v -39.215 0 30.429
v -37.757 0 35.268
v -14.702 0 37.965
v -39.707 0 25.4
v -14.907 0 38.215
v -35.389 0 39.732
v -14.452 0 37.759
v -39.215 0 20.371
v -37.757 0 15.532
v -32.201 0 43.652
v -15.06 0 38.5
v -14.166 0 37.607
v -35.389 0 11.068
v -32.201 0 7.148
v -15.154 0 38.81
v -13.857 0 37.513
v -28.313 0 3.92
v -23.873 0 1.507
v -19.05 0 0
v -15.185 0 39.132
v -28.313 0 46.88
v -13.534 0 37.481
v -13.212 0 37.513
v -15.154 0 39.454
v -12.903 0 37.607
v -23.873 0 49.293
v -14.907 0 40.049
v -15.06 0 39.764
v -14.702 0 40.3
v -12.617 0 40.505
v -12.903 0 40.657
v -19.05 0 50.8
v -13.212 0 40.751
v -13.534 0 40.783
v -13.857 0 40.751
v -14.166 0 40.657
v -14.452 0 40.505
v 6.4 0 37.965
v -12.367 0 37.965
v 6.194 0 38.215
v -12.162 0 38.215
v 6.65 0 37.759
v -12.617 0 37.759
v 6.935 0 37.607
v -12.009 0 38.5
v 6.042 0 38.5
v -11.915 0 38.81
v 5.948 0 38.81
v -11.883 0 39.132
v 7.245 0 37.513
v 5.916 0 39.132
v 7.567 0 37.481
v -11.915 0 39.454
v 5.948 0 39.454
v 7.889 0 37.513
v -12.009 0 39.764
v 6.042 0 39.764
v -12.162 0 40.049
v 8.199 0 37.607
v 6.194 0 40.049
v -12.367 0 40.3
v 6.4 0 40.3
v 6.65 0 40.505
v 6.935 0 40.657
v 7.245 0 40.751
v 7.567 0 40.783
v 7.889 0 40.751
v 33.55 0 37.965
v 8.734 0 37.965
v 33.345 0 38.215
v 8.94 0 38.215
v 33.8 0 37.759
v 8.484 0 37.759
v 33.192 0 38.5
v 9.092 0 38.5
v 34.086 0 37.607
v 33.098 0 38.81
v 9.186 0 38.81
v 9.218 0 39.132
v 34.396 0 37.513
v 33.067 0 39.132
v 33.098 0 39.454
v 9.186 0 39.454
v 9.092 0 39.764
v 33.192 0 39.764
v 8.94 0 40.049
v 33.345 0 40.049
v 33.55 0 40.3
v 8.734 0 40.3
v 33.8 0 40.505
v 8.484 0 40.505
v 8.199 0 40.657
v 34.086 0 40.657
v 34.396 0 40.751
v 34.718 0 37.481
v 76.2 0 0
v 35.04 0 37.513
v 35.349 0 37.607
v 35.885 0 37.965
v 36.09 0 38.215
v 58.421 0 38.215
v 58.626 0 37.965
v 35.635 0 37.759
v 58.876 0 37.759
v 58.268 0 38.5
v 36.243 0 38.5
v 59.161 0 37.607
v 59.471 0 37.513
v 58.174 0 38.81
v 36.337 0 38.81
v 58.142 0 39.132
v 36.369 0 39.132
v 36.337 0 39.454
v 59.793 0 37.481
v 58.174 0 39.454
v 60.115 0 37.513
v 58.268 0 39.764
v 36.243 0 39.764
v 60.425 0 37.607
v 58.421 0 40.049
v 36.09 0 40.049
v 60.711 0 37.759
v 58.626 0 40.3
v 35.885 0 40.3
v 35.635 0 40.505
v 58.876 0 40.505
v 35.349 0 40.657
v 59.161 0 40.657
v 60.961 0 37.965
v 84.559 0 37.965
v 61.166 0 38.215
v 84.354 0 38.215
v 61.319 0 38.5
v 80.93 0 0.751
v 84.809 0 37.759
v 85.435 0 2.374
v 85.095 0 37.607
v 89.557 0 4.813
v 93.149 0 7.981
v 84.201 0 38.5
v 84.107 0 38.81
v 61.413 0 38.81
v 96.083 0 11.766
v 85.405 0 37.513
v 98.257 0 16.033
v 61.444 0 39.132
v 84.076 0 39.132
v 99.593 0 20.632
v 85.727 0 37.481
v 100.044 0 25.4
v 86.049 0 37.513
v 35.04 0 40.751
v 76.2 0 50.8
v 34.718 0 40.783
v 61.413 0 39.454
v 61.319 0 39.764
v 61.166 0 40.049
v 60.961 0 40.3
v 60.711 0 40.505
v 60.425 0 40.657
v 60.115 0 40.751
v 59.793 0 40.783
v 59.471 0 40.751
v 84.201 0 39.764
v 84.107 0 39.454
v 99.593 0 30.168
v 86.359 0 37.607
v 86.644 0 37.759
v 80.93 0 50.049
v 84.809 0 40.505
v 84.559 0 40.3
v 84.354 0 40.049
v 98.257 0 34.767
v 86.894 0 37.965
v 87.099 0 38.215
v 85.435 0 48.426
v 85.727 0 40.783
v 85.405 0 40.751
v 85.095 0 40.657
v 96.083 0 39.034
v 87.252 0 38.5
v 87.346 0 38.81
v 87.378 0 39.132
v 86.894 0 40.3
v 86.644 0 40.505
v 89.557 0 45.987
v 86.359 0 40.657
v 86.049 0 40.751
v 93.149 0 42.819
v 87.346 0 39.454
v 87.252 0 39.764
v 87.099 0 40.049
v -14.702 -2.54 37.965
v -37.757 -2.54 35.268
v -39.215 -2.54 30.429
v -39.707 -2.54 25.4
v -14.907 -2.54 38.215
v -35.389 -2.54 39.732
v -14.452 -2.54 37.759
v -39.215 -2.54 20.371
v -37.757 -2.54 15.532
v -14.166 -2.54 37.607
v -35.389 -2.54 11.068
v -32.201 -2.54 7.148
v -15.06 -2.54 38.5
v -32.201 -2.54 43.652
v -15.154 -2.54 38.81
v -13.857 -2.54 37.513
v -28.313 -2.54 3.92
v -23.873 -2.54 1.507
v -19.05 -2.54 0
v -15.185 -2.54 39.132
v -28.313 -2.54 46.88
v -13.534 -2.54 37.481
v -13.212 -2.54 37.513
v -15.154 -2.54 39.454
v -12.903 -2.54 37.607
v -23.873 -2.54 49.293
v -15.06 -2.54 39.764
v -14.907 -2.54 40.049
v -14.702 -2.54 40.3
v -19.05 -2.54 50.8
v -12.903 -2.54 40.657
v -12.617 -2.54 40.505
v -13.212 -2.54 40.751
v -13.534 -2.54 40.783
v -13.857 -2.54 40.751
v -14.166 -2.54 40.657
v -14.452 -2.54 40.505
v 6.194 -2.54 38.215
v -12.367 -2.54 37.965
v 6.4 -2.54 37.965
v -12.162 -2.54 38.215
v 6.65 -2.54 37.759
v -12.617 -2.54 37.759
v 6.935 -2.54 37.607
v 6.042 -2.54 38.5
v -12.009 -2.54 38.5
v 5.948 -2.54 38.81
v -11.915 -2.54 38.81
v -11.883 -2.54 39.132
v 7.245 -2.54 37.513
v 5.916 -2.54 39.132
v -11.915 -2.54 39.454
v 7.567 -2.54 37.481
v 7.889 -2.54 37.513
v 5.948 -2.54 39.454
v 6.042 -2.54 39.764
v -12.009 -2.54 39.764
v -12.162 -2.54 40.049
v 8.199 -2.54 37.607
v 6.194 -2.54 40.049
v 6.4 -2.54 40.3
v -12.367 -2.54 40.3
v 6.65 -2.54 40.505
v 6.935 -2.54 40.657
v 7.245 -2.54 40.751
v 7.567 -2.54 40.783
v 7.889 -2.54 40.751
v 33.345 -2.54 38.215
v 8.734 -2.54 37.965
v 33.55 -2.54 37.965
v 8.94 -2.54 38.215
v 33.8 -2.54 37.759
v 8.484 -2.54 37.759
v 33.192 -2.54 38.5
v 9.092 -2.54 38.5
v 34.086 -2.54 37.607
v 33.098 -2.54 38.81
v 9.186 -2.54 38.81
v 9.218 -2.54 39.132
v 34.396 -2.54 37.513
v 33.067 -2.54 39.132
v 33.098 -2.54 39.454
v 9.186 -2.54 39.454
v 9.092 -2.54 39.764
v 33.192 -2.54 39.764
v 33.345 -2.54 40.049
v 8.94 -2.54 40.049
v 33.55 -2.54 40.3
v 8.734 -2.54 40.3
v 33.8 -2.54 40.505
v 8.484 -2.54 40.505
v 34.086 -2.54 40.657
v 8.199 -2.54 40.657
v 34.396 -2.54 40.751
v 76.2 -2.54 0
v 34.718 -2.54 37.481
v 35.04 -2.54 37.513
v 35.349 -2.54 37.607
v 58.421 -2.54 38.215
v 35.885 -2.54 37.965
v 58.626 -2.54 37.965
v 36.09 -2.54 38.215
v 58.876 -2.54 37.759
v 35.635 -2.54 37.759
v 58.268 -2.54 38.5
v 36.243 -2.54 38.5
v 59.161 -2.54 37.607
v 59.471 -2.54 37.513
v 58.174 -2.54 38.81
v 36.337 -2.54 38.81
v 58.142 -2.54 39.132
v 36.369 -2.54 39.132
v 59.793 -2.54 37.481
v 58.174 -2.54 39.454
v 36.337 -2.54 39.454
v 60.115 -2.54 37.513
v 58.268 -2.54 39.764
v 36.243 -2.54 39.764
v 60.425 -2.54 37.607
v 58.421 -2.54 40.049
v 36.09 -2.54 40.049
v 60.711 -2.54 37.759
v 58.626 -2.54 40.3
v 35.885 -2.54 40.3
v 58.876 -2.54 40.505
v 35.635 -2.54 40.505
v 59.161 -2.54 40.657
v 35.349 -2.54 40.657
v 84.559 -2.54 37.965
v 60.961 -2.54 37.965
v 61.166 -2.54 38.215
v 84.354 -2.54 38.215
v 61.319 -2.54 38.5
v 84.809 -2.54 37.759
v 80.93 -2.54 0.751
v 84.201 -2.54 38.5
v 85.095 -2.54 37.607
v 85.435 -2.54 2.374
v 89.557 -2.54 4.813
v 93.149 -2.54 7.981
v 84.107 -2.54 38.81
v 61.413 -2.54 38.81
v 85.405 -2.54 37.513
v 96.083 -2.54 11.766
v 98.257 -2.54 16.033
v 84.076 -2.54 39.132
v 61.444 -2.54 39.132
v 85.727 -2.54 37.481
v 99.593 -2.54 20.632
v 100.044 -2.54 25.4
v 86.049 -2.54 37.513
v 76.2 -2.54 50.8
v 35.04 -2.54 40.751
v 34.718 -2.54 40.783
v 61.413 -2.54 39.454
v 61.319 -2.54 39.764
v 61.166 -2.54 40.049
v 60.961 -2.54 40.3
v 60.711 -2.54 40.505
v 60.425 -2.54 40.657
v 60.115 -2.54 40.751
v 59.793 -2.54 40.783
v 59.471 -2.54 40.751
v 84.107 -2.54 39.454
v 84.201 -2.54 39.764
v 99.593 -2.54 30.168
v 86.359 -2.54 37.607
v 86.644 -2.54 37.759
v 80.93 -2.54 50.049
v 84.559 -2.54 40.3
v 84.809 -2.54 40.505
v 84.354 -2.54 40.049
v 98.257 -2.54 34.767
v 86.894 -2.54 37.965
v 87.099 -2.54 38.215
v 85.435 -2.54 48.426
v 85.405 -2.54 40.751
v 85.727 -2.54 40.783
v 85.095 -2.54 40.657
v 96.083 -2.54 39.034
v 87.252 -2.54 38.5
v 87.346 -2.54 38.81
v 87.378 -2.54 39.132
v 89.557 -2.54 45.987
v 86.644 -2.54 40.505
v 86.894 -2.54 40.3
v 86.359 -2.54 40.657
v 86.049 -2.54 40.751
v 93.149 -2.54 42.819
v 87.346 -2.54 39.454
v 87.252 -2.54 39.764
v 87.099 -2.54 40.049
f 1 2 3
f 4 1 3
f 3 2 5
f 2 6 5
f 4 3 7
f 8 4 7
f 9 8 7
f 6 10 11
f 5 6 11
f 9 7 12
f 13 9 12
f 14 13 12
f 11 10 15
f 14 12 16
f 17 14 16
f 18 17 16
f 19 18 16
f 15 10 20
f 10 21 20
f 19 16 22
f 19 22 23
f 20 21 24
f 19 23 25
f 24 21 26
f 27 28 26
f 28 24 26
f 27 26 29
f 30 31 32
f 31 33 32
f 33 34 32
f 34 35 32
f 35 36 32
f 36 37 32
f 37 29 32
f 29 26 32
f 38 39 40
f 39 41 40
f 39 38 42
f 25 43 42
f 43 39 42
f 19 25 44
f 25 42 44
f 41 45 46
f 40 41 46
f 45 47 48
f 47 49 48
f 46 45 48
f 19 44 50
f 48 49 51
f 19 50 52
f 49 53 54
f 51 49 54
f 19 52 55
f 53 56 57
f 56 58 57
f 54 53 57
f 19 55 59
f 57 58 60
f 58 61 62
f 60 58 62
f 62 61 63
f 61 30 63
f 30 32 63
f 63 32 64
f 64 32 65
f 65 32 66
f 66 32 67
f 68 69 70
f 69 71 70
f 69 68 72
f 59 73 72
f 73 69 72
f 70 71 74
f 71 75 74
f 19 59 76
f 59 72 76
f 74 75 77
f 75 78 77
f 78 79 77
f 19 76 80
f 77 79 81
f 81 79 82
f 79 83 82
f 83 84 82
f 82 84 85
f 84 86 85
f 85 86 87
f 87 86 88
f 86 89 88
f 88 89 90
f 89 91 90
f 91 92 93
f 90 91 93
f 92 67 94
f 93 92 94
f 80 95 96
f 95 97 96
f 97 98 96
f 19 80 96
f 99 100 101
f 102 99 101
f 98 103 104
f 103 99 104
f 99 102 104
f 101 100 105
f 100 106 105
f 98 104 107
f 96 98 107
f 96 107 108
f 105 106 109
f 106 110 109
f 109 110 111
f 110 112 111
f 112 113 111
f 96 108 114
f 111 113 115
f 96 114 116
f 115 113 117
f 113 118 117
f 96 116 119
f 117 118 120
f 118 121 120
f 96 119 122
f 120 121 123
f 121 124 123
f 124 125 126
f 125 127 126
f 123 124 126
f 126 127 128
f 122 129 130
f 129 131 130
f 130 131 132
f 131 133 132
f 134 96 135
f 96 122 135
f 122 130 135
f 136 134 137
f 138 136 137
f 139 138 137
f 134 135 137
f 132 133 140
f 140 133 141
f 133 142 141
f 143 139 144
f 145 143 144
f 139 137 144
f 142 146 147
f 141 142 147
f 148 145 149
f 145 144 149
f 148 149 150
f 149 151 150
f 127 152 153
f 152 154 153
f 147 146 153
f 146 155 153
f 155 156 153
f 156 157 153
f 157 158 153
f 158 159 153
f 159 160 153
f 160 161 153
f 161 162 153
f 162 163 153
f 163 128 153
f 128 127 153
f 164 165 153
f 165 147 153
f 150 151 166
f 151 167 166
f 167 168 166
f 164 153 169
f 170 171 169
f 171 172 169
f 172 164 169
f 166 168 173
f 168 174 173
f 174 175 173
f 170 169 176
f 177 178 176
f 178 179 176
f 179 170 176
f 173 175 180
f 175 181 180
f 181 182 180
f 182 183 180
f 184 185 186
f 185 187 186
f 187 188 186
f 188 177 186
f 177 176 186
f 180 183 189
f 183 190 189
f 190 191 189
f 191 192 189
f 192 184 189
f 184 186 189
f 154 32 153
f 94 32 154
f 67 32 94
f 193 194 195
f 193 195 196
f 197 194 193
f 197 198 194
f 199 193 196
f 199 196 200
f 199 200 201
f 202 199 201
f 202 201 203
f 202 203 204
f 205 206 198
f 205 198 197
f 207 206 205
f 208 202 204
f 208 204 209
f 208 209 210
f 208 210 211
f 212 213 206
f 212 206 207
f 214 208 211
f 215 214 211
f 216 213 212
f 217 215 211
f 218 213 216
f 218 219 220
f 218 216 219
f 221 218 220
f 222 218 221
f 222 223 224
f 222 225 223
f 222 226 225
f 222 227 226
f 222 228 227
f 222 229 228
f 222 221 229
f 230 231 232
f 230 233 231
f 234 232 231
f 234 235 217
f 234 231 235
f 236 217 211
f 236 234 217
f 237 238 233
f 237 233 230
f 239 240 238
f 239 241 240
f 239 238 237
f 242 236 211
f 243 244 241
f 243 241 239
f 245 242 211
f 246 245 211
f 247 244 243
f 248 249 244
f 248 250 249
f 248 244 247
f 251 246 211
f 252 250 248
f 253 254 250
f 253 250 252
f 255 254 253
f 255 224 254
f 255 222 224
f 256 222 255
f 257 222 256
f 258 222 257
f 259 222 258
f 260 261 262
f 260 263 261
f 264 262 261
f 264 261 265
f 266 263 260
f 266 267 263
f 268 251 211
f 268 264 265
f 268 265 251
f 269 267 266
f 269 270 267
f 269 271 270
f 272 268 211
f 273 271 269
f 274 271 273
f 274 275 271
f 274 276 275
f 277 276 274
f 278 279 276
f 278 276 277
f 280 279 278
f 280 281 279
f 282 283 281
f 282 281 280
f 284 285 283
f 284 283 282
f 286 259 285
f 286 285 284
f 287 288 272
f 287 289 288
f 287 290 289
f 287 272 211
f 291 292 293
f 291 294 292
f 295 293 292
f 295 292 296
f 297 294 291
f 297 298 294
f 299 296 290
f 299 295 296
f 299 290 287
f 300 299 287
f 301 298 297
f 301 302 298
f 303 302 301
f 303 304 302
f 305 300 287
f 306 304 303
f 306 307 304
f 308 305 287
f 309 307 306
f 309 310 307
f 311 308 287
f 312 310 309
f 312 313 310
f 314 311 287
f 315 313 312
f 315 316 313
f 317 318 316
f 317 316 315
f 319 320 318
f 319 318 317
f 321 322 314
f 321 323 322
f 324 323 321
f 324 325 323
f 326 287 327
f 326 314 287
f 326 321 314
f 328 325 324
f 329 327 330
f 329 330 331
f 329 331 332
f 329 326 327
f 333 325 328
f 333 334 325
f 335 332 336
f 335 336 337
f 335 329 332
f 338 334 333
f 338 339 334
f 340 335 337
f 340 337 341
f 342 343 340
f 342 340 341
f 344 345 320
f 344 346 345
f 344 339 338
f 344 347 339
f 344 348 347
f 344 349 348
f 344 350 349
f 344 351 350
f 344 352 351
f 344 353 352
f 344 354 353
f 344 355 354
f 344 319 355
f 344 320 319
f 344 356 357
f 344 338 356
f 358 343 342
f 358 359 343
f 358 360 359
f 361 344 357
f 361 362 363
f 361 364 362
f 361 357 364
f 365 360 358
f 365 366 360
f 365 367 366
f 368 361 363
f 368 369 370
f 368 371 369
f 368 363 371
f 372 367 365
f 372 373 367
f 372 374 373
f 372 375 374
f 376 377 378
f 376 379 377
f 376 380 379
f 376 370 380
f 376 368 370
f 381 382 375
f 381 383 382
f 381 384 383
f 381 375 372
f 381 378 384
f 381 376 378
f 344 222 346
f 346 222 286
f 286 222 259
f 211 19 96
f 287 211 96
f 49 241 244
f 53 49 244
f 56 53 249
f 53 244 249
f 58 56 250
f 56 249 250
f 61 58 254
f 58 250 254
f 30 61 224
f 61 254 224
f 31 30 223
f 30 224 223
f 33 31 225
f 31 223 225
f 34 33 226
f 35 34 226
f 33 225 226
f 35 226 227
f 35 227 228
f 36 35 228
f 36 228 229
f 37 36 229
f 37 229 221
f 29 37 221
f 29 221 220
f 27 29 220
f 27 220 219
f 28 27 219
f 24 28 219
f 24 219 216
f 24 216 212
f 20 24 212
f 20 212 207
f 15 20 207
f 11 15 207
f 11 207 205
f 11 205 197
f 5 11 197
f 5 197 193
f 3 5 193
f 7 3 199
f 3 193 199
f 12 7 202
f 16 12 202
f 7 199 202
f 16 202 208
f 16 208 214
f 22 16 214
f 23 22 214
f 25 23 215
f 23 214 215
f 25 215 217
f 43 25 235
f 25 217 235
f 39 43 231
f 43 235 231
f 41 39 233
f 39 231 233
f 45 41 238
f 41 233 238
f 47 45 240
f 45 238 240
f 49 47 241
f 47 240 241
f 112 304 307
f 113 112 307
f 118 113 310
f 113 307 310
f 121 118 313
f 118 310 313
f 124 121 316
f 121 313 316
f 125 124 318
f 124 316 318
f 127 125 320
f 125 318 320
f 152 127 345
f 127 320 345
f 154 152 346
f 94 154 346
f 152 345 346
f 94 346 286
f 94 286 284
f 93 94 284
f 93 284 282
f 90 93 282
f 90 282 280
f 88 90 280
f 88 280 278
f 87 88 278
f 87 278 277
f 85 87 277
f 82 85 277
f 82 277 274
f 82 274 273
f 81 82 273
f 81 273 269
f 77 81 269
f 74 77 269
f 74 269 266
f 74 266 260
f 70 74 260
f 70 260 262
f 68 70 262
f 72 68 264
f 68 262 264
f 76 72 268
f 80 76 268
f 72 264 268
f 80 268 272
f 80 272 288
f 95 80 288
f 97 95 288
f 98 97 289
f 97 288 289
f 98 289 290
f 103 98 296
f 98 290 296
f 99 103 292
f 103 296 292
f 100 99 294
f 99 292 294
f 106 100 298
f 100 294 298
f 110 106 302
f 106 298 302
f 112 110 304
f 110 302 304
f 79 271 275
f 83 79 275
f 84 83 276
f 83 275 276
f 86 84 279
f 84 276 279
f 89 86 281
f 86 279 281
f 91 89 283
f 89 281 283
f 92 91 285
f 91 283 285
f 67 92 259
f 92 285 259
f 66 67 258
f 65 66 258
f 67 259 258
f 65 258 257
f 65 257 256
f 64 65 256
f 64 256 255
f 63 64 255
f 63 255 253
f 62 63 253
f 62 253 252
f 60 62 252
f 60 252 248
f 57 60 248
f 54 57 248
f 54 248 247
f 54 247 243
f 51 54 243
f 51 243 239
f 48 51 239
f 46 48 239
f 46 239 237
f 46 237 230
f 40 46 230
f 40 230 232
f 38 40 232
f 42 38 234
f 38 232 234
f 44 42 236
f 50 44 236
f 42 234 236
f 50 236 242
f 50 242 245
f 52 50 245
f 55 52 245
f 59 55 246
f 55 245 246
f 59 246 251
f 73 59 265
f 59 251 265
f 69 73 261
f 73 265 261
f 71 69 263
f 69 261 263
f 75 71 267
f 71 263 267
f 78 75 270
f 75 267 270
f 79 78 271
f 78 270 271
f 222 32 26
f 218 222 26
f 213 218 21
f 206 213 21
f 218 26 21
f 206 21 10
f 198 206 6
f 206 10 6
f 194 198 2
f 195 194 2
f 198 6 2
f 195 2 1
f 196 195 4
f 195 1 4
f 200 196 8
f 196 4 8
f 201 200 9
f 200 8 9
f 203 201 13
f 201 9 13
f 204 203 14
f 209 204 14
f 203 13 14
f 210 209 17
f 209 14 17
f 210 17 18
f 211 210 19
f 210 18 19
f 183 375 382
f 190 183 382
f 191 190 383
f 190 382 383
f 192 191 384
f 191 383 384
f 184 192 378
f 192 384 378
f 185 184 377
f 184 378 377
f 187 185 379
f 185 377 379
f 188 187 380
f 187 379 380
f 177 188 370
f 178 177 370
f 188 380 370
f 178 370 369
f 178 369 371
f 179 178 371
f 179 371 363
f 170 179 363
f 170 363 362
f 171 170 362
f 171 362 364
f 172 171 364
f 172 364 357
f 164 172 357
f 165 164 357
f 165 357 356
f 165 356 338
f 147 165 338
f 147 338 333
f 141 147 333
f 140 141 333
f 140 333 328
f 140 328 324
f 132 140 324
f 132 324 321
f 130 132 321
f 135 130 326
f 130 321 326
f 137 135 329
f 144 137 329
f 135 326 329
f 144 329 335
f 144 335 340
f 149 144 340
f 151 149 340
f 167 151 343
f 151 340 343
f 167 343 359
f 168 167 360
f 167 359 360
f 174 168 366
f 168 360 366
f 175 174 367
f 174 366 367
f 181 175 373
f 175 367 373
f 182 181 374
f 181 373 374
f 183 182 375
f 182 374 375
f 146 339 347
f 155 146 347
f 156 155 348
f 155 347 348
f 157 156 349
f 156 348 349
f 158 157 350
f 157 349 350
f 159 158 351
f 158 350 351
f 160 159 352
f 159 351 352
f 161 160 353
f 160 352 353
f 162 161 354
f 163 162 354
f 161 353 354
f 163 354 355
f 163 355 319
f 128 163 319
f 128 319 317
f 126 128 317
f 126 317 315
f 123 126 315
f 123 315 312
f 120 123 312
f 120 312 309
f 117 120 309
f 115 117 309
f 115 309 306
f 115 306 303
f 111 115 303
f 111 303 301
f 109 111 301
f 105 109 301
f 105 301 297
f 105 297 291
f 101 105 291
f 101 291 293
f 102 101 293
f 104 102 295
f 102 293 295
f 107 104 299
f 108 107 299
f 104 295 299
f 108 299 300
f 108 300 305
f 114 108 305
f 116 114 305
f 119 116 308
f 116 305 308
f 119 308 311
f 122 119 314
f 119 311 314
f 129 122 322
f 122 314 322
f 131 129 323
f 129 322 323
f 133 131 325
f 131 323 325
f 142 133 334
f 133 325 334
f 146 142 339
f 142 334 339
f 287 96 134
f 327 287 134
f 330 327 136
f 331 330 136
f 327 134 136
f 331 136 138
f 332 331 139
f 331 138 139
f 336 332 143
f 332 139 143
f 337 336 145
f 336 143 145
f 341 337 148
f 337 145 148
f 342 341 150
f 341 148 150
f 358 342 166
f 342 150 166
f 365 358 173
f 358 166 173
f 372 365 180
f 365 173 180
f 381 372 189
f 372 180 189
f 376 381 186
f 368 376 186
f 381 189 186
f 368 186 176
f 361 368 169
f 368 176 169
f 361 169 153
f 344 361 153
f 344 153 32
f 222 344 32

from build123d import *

# Parameters (mm, degrees)
F1_DEPTH = 2.54
F2_R     = 1.651
F3_DEPTH = 25.4


with BuildPart() as f1:
    # F0 (on Front) → F1 (new body)
    with BuildSketch(Plane.XZ):
        with BuildLine():
            Line((-19.05, 0), (0, 0))
            Line((0, 0), (76.2, 0))
            ThreePointArc((76.2, 0), (100.04356, 25.4), (76.2, 50.8))
            Line((76.2, 50.8), (0, 50.8))
            Line((0, 50.8), (-19.05, 50.8))
            ThreePointArc((-19.05, 50.8), (-39.70724, 25.4), (-19.05, 0))
        make_face()
    extrude(amount=F1_DEPTH)

    # F2 (on face) → F3 (cut)
    with BuildSketch(Plane.XZ.offset(2.54)):
        with Locations((59.7933, 39.132159)):
            Circle(F2_R)
        with Locations((85.7267, 39.132159)):
            Circle(F2_R)
        with Locations((34.717675, 39.132159)):
            Circle(F2_R)
        with Locations((7.566978, 39.132159)):
            Circle(F2_R)
        with Locations((-13.534474, 39.132159)):
            Circle(F2_R)
    extrude(amount=-F3_DEPTH, mode=Mode.SUBTRACT)


solid = f1.part
